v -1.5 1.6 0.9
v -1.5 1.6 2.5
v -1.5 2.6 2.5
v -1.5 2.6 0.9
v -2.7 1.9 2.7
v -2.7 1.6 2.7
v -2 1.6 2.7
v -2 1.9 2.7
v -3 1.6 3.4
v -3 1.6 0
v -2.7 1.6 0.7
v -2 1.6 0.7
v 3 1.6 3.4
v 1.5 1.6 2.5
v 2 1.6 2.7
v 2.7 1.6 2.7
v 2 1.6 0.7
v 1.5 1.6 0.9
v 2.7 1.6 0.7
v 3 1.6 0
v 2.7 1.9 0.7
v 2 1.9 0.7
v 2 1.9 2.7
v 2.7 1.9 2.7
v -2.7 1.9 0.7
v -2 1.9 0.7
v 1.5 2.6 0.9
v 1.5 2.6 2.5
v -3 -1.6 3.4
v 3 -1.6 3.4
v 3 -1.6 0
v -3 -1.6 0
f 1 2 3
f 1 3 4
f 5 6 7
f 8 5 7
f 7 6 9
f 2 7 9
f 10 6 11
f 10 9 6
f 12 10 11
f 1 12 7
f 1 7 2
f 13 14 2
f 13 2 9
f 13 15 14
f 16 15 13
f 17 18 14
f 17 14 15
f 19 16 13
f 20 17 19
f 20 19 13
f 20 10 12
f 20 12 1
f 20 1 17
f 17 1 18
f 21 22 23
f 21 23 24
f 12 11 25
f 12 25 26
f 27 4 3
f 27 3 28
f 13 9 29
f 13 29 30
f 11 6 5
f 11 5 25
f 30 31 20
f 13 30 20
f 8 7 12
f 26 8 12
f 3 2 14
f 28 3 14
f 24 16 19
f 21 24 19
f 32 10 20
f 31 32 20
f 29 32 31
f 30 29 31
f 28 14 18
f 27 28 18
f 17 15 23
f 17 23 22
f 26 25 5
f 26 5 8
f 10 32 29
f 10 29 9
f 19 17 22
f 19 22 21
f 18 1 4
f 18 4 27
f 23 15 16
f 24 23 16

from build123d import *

# Parameters (mm, degrees)
SKICA1_W                = 6
SKICA1_H                = 3.2
P_IDAT_VYSUNUT_M1_DEPTH = 3.4
SKICA2_W                = 3
SKICA2_H                = 1.6
P_IDAT_VYSUNUT_M2_DEPTH = 1
SKICA3_W                = 0.7
SKICA3_H                = 2
P_IDAT_VYSUNUT_M3_DEPTH = 0.3


with BuildPart() as part:
    # Skica1 → Přidat vysunutím1 (new body)
    with BuildSketch(Plane.XY):
        Rectangle(SKICA1_W, SKICA1_H)
    extrude(amount=P_IDAT_VYSUNUT_M1_DEPTH)

    # Skica2 → Přidat vysunutím2 (add)
    with BuildSketch(Plane(origin=(0, 1.6, 0), x_dir=(1, 0, 0), z_dir=(0, 1, 0))):
        with Locations((0, -1.7)):
            Rectangle(SKICA2_W, SKICA2_H)
    extrude(amount=P_IDAT_VYSUNUT_M2_DEPTH)

    # Skica3 → Přidat vysunutím3 (add)
    with BuildSketch(Plane(origin=(0, 1.6, 0), x_dir=(1, 0, 0), z_dir=(0, 1, 0))):
        with Locations((-2.35, -1.7)):
            Rectangle(SKICA3_W, SKICA3_H)
        with Locations((2.35, -1.7)):
            Rectangle(SKICA3_W, SKICA3_H)
    extrude(amount=P_IDAT_VYSUNUT_M3_DEPTH)


solid = part.part
